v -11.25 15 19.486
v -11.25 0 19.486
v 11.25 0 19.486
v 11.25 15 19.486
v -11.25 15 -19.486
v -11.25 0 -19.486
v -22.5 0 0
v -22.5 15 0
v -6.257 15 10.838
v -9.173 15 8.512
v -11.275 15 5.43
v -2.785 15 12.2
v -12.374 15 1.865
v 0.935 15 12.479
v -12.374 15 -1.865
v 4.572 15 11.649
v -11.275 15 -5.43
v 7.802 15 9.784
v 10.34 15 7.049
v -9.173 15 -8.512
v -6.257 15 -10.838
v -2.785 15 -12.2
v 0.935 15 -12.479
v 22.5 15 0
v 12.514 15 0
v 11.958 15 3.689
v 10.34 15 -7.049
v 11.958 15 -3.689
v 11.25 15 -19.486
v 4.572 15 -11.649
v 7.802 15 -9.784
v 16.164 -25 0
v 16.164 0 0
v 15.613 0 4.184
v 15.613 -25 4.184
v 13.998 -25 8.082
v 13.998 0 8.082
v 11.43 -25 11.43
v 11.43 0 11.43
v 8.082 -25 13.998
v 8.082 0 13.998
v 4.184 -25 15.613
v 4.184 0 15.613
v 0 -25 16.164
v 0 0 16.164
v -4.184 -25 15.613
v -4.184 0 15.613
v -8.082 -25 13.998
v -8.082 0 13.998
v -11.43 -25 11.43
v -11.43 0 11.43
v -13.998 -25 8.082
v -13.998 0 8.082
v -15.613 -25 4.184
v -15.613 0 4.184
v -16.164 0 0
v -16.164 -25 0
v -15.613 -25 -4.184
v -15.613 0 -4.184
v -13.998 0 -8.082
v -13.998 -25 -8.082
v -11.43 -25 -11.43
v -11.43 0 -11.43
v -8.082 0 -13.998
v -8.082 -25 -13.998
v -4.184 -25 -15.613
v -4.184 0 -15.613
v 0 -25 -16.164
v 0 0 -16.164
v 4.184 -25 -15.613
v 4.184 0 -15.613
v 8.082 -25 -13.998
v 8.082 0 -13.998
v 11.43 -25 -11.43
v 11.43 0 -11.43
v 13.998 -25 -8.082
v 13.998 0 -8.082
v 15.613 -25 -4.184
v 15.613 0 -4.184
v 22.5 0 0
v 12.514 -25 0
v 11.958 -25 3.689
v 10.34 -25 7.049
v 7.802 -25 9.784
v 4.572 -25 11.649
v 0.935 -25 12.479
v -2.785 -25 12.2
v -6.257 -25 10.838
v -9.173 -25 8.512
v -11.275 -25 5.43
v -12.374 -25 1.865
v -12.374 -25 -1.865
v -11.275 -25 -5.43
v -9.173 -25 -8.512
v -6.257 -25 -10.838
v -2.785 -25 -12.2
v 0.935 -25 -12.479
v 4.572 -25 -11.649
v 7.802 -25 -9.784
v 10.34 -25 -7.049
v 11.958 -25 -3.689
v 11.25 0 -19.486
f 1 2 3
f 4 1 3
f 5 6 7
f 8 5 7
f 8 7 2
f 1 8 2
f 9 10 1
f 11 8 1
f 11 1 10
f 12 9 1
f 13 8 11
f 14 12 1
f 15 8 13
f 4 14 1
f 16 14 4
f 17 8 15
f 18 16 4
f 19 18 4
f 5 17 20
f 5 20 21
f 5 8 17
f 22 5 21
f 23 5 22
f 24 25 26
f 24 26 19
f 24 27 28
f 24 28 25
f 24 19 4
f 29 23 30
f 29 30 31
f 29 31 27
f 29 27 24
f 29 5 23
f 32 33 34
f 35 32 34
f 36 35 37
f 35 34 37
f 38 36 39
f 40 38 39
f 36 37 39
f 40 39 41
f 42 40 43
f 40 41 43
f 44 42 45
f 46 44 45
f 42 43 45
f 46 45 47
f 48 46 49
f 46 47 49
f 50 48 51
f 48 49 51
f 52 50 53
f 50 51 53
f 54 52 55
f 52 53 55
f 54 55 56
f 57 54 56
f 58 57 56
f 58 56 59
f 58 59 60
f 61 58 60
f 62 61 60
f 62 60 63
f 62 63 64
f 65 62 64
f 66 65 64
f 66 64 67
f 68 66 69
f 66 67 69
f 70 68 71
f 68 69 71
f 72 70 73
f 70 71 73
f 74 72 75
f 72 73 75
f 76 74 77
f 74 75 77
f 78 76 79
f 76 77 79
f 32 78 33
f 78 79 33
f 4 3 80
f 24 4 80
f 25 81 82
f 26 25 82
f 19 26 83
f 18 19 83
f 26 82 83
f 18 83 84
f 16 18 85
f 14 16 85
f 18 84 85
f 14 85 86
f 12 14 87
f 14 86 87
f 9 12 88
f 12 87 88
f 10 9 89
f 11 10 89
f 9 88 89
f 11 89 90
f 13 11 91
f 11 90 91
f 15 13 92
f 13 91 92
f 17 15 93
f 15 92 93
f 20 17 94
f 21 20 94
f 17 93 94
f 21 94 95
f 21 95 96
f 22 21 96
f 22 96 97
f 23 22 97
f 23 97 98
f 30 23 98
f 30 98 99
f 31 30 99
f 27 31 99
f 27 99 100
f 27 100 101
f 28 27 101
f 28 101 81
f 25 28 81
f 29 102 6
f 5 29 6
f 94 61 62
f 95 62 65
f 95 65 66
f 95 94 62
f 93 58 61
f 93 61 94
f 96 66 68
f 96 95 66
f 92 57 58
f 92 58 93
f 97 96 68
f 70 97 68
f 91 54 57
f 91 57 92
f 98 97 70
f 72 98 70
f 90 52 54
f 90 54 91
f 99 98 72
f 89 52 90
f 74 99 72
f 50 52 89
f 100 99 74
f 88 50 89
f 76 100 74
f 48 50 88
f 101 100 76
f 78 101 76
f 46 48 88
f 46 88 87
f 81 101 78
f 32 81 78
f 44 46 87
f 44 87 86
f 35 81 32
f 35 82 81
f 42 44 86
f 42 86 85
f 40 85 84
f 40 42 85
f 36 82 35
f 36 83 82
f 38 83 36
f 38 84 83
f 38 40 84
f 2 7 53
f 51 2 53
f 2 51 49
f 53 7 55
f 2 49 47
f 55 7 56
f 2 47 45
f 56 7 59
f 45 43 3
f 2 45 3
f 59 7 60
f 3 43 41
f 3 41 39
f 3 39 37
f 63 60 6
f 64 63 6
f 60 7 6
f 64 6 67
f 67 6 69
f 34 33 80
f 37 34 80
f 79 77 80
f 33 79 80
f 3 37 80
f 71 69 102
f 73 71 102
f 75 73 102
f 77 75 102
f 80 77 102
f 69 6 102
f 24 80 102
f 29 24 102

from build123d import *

# Parameters (mm, degrees)
SALIENTE_EXTRUIR1_DEPTH = 15
CROQUIS2_R              = 16.164040976
SALIENTE_EXTRUIR2_DEPTH = 25
CROQUIS4_R              = 12.514075771
CORTAR_EXTRUIR1_DEPTH   = 61


with BuildPart() as part:
    # Croquis1 → Saliente-Extruir1 (new body)
    with BuildSketch(Plane(origin=(0, 0, 0), x_dir=(1, 0, 0), z_dir=(0, 1, 0))):
        Polygon((22.5, 0), (11.25, 19.485571585), (-11.25, 19.485571585), (-22.5, 0), (-11.25, -19.485571585), (11.25, -19.485571585), align=None)
    extrude(amount=SALIENTE_EXTRUIR1_DEPTH)

    # Croquis2 → Saliente-Extruir2 (add)
    with BuildSketch(Plane.XZ):
        Circle(CROQUIS2_R)
    extrude(amount=SALIENTE_EXTRUIR2_DEPTH)

    # Croquis4 → Cortar-Extruir1 (cut, through all)
    with BuildSketch(Plane.XZ.offset(45)):
        Circle(CROQUIS4_R)
    extrude(amount=-CORTAR_EXTRUIR1_DEPTH, mode=Mode.SUBTRACT)


solid = part.part
